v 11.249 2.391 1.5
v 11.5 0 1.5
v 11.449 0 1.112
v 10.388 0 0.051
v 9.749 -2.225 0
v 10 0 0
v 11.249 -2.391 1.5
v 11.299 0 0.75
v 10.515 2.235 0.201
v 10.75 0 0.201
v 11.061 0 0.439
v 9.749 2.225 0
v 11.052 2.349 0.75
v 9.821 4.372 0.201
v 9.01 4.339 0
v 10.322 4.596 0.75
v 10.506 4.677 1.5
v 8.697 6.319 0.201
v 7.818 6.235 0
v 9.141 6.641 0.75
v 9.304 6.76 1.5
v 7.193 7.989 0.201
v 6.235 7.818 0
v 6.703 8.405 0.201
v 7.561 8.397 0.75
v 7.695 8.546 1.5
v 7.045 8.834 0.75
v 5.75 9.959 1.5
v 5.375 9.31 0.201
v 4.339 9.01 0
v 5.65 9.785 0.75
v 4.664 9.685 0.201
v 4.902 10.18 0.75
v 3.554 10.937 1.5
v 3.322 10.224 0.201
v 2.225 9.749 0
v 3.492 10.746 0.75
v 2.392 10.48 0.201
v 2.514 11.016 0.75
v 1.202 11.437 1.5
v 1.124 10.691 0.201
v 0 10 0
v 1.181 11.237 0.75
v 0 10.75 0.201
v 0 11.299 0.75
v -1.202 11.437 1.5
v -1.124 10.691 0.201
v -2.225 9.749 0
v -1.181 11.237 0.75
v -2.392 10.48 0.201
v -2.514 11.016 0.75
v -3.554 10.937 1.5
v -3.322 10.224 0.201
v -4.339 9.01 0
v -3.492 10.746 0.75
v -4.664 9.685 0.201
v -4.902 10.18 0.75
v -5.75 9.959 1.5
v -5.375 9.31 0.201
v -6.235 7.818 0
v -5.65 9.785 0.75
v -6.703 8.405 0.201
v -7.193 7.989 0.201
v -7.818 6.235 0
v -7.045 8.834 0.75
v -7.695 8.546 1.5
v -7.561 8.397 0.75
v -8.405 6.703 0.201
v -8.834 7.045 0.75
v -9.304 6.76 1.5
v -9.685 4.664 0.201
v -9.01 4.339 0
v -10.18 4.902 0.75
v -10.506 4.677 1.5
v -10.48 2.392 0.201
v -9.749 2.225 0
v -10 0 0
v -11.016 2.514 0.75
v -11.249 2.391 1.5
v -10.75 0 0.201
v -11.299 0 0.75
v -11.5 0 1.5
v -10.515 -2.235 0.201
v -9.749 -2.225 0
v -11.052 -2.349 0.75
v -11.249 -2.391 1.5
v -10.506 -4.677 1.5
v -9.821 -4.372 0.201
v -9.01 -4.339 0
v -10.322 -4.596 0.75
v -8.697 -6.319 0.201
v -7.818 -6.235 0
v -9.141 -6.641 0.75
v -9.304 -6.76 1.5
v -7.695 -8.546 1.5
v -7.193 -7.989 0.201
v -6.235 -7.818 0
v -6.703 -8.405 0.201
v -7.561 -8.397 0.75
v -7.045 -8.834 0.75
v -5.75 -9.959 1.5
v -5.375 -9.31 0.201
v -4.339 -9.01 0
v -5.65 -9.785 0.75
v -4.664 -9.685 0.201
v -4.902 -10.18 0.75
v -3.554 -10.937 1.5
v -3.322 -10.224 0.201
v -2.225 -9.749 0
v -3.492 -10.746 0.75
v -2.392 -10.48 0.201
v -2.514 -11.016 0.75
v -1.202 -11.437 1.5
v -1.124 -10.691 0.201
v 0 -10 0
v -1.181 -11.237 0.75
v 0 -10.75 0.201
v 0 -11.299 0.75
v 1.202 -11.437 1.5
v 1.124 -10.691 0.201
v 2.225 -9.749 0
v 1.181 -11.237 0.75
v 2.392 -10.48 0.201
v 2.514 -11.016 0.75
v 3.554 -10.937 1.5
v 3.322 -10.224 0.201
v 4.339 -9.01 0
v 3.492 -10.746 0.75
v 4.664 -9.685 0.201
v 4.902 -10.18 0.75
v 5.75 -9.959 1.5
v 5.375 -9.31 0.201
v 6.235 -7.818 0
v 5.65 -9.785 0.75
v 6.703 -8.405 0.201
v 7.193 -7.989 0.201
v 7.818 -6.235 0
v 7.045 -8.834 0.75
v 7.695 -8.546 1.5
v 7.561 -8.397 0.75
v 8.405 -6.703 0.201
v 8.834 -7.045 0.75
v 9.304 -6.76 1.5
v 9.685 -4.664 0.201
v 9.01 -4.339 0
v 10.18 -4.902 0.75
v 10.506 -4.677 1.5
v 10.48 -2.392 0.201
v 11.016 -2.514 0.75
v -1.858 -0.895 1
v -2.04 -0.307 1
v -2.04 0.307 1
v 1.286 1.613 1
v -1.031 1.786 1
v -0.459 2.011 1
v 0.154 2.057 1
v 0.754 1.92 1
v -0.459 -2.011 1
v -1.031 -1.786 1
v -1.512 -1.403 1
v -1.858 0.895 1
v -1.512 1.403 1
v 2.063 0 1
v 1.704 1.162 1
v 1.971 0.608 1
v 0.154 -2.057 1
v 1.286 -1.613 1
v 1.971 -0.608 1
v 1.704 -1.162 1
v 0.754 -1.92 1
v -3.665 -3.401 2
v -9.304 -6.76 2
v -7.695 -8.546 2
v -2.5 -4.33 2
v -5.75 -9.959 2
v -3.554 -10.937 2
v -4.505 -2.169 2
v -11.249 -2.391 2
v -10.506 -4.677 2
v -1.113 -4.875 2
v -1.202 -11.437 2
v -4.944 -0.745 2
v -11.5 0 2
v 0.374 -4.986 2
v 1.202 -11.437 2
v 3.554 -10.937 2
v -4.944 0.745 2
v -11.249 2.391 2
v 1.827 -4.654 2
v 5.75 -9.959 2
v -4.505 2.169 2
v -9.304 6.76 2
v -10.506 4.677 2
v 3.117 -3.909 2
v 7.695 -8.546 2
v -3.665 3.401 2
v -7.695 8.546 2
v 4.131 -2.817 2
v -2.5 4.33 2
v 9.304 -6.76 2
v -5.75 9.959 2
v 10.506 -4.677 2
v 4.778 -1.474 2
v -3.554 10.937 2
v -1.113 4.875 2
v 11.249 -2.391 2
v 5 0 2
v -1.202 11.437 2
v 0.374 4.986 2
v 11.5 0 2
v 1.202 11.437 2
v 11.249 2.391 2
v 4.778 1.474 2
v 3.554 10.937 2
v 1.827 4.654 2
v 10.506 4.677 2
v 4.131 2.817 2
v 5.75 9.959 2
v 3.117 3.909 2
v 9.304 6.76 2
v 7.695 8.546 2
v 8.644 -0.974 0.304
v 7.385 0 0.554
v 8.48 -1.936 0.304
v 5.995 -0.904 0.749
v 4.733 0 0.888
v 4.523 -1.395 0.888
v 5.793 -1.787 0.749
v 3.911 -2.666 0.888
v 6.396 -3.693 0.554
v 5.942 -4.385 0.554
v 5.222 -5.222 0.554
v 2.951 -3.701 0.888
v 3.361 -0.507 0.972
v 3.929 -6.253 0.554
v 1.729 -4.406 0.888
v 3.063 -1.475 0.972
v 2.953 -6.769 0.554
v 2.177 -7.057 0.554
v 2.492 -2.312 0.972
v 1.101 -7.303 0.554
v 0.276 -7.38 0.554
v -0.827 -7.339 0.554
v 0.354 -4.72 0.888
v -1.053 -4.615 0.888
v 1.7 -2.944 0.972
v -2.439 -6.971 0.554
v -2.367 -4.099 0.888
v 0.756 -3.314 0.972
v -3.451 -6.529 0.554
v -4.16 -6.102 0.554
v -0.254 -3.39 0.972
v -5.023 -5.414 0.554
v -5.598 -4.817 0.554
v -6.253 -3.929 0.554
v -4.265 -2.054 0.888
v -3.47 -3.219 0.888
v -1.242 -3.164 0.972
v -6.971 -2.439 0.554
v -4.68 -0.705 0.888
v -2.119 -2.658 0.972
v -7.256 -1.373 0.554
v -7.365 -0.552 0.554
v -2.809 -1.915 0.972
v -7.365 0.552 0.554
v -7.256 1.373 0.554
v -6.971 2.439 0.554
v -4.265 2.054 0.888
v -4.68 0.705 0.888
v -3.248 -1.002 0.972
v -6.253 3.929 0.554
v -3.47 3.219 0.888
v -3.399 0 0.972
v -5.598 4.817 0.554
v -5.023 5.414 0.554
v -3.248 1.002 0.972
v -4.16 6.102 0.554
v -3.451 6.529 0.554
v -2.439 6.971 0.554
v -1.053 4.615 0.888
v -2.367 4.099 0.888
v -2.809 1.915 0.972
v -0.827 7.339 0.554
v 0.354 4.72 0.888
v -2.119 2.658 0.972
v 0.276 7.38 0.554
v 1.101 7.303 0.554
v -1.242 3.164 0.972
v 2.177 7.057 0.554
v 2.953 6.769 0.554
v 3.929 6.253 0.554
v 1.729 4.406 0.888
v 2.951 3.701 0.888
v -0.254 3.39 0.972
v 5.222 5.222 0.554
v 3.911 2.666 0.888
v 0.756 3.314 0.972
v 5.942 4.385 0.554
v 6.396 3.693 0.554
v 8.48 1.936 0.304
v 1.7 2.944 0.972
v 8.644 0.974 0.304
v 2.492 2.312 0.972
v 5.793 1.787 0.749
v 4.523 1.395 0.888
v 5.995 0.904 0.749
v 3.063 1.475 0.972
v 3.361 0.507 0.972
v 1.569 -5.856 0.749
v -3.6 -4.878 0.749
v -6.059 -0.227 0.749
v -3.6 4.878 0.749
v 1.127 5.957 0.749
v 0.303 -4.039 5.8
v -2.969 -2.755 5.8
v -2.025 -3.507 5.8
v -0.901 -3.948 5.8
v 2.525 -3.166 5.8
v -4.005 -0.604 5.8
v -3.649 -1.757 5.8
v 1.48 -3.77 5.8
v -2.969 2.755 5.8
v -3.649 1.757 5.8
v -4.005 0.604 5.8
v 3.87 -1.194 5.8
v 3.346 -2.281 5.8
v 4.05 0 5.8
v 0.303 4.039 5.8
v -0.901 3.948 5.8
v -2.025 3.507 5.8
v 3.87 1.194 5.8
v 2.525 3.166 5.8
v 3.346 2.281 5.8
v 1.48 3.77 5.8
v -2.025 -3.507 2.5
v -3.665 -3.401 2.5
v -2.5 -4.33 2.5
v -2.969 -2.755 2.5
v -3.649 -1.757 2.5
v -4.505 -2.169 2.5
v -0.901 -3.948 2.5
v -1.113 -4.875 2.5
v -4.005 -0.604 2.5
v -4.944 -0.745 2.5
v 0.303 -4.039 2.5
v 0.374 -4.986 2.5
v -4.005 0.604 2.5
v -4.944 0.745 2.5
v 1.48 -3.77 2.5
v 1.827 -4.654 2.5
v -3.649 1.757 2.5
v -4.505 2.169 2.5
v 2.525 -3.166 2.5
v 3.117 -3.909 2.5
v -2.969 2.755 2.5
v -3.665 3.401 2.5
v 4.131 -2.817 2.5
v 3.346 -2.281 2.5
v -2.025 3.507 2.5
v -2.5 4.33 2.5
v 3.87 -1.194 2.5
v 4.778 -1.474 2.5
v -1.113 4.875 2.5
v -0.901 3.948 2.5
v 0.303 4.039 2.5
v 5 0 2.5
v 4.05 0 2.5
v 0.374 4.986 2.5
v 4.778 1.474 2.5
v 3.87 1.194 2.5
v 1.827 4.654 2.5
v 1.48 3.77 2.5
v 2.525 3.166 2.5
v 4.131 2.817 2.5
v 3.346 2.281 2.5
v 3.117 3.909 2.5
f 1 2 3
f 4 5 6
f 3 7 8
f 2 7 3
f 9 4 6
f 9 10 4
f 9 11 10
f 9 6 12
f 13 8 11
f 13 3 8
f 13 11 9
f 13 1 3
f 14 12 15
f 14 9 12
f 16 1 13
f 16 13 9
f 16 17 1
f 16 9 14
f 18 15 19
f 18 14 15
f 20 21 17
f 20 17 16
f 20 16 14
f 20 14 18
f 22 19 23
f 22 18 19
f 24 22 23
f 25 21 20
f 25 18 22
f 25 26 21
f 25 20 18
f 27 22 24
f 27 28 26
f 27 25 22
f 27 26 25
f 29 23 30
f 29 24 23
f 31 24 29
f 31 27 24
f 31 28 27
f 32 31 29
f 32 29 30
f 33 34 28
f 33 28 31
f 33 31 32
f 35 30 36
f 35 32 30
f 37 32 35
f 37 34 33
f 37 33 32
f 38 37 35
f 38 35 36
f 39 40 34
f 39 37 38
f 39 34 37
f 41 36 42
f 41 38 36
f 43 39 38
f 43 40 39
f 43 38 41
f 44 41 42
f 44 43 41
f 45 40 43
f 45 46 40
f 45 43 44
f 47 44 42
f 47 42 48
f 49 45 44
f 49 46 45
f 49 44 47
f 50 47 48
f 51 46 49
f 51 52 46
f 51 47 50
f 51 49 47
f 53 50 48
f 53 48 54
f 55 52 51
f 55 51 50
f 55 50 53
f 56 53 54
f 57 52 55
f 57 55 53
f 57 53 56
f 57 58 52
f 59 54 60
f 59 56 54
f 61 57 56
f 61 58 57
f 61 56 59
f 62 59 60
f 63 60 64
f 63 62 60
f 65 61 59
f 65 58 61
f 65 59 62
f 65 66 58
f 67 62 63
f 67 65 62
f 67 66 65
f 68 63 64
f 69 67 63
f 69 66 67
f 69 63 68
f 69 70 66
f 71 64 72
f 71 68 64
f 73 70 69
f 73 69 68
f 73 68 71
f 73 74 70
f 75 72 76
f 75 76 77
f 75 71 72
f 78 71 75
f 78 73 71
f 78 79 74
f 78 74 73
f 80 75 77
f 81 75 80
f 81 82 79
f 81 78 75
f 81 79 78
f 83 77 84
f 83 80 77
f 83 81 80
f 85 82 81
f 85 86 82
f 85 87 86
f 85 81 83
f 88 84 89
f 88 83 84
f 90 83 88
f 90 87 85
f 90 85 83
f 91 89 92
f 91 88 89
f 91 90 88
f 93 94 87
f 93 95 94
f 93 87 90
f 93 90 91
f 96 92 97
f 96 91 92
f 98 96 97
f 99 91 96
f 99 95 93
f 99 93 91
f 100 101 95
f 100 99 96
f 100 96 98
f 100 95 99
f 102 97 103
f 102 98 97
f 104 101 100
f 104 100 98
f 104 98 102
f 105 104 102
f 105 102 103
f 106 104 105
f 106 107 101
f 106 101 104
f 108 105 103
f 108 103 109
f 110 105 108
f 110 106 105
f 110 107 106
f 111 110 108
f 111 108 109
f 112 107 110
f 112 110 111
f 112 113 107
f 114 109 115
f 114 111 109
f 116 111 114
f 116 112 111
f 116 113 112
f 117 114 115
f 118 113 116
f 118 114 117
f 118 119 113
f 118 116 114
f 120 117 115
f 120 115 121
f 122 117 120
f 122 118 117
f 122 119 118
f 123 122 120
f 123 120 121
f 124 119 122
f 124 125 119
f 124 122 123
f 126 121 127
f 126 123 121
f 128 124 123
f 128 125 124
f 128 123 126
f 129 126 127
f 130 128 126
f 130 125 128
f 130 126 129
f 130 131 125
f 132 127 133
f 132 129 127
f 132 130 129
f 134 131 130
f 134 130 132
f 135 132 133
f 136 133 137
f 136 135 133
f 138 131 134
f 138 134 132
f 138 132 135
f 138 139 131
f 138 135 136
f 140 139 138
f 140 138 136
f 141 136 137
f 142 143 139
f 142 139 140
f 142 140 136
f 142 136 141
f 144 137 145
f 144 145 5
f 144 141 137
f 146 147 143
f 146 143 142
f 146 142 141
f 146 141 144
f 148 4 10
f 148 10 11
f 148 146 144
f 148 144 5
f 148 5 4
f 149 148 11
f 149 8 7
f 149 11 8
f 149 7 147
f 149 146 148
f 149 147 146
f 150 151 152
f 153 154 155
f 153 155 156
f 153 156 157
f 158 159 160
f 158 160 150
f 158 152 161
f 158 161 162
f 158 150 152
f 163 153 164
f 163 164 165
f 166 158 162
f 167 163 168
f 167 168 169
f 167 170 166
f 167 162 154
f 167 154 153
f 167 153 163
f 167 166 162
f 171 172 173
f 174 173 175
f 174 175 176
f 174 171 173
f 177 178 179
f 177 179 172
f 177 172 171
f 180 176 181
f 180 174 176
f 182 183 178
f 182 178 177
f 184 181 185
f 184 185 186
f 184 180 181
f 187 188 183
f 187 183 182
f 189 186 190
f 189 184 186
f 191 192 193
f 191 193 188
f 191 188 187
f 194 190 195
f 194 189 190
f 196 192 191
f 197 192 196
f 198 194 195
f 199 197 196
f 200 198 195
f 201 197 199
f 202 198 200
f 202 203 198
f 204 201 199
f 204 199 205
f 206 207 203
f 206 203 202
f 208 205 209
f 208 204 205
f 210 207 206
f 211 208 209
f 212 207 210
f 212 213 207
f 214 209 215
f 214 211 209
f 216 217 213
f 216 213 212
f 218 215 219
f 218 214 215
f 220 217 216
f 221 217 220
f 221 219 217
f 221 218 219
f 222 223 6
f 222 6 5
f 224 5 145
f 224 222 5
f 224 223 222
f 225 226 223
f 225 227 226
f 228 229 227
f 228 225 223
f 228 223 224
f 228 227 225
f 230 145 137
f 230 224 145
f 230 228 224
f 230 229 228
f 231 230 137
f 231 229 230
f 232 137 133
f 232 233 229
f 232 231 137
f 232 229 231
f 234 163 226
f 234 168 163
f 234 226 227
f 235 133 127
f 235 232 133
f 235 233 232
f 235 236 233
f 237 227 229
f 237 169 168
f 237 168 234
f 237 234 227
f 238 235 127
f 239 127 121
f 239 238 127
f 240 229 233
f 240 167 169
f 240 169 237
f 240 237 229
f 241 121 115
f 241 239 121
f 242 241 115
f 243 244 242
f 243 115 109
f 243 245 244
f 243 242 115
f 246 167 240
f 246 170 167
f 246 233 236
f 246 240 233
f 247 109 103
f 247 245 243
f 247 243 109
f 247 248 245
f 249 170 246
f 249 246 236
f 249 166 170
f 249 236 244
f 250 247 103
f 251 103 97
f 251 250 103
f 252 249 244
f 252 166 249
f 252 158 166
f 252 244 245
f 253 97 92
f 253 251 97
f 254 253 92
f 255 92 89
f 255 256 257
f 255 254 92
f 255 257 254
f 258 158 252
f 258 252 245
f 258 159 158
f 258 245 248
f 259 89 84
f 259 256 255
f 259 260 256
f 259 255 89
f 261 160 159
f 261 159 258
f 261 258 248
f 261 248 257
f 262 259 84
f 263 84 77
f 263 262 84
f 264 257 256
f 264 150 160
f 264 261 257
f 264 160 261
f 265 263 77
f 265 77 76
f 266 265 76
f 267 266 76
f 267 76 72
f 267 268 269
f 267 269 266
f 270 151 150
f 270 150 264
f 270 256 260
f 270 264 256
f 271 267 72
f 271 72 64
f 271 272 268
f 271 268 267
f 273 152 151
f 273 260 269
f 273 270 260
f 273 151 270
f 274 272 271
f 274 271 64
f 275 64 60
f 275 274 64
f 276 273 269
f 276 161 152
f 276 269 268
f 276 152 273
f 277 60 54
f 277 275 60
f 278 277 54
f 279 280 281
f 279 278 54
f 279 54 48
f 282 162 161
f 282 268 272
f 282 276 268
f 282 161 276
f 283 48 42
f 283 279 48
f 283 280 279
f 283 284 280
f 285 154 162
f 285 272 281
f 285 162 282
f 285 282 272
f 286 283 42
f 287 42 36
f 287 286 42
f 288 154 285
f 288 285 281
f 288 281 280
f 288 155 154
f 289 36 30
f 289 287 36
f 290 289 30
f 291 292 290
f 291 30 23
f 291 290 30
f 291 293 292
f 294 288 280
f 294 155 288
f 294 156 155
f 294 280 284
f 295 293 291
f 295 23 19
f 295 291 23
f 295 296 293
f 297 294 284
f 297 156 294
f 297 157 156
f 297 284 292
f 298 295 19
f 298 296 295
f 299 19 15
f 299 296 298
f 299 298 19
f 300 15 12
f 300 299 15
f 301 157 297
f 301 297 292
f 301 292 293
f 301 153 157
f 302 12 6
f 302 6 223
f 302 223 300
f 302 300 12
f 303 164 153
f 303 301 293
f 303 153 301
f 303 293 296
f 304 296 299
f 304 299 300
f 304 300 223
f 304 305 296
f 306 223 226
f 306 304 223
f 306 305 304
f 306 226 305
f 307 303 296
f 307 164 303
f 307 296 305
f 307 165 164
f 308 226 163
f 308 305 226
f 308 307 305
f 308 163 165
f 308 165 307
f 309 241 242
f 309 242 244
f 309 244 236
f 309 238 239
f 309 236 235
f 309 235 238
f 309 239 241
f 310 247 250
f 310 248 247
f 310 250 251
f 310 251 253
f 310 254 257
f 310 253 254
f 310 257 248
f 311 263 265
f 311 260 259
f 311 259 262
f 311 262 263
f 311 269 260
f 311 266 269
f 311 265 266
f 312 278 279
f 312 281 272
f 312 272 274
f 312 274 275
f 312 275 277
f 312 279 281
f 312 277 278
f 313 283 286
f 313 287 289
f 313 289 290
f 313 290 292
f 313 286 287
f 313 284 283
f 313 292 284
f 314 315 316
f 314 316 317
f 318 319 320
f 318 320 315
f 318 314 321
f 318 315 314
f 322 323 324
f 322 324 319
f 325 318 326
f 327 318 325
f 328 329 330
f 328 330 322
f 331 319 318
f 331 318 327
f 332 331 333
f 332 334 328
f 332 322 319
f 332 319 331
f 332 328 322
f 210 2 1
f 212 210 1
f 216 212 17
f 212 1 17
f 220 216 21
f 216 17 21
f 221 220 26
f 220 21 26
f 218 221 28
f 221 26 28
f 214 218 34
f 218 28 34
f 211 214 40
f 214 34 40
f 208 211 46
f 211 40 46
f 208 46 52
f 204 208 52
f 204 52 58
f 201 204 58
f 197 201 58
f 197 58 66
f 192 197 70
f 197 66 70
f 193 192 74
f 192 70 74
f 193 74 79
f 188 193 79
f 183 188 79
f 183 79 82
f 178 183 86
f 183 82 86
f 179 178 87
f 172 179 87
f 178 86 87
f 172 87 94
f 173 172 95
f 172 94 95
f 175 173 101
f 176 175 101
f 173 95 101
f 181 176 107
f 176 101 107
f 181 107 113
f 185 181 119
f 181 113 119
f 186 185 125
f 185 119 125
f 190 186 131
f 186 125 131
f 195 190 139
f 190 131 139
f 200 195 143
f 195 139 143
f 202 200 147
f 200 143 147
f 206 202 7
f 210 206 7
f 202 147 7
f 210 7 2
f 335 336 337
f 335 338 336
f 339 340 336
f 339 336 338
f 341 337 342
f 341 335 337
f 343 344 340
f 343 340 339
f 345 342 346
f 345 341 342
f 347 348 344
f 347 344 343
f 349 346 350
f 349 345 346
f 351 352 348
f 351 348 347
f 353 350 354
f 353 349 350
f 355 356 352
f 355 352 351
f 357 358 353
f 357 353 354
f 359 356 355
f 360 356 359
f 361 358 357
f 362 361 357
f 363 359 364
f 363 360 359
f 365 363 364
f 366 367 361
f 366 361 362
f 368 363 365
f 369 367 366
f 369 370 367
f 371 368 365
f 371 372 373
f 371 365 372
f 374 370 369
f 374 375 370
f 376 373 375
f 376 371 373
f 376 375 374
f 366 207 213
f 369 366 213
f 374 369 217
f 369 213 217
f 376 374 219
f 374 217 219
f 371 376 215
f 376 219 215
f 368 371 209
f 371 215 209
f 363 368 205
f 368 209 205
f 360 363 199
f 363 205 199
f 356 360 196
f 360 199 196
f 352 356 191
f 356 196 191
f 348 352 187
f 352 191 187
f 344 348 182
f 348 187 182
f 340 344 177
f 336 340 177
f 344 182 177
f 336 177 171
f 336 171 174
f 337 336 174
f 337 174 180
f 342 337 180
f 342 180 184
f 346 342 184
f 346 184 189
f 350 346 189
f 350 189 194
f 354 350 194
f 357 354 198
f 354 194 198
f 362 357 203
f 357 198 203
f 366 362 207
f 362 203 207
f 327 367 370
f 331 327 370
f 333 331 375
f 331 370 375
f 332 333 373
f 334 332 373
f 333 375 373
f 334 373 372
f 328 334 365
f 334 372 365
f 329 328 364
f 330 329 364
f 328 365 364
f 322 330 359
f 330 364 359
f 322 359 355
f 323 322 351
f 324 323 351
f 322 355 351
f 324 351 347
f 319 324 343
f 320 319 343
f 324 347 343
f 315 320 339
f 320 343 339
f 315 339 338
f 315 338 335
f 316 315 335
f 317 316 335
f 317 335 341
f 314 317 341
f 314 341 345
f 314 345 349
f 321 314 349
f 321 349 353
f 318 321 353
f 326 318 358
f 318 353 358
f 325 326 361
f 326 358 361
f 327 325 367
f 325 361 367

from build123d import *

# Parameters (mm, degrees)
F0_R     = 11.5
F1_DEPTH = 2
F2_R     = 5
F3_DEPTH = 0.5
F4_R     = 4.05
F5_DEPTH = 3.3
F6_R     = 10
F7_DEPTH = 1
F9_R     = 1.49999


# Not quite as in the source:
# - a fillet or chamfer that OpenCascade refuses, or shapes differently, is made with other operations: its cross-section is extruded or revolved along the edge and cut away or added
# - a fillet or chamfer is up to 0.001 mm smaller than in the source, because OpenCascade refuses the exact size


with BuildPart() as f1:
    # F0 (on Top) → F1 (new body)
    with BuildSketch(Plane.XY):
        Circle(F0_R)
    extrude(amount=F1_DEPTH)

    # F2 (on face) → F3 (join)
    with BuildSketch(Plane.XY.offset(2)):
        Circle(F2_R)
    extrude(amount=F3_DEPTH)

    # F4 (on face) → F5 (join)
    with BuildSketch(Plane.XY.offset(2.5)):
        Circle(F4_R)
    extrude(amount=F5_DEPTH)

    # F6 (on face) → F7 (cut)
    with BuildSketch(Plane(origin=(0, 0, 0), x_dir=(1, 0, 0), z_dir=(0, 0, -1))):
        Circle(F6_R)
    extrude(amount=-F7_DEPTH, mode=Mode.SUBTRACT)

    # F8: fillet of radius 32 on 1 edges, made by hand

    # F8_s1 → F8_t2 (revolve)
    with BuildSketch(Plane.XZ):
        with BuildLine():
            ThreePointArc((10, 0), (6.0627460668, 0.7490157328), (2.0627460668, 1))
            Line((2.0627460668, 1), (10, 1))
            Line((10, 1), (10, 0))
        make_face()
    revolve(axis=Axis((0, 0, 1), (0, 0, -1)))

    # F9 (radius 1.5 in the source; OpenCascade refuses exactly that, so slightly less here)
    f9_edges = [f1.edges().sort_by_distance(p)[0] for p in [
        (-11.5, 0, 0),
    ]]
    fillet(f9_edges, radius=F9_R)


solid = f1.part
